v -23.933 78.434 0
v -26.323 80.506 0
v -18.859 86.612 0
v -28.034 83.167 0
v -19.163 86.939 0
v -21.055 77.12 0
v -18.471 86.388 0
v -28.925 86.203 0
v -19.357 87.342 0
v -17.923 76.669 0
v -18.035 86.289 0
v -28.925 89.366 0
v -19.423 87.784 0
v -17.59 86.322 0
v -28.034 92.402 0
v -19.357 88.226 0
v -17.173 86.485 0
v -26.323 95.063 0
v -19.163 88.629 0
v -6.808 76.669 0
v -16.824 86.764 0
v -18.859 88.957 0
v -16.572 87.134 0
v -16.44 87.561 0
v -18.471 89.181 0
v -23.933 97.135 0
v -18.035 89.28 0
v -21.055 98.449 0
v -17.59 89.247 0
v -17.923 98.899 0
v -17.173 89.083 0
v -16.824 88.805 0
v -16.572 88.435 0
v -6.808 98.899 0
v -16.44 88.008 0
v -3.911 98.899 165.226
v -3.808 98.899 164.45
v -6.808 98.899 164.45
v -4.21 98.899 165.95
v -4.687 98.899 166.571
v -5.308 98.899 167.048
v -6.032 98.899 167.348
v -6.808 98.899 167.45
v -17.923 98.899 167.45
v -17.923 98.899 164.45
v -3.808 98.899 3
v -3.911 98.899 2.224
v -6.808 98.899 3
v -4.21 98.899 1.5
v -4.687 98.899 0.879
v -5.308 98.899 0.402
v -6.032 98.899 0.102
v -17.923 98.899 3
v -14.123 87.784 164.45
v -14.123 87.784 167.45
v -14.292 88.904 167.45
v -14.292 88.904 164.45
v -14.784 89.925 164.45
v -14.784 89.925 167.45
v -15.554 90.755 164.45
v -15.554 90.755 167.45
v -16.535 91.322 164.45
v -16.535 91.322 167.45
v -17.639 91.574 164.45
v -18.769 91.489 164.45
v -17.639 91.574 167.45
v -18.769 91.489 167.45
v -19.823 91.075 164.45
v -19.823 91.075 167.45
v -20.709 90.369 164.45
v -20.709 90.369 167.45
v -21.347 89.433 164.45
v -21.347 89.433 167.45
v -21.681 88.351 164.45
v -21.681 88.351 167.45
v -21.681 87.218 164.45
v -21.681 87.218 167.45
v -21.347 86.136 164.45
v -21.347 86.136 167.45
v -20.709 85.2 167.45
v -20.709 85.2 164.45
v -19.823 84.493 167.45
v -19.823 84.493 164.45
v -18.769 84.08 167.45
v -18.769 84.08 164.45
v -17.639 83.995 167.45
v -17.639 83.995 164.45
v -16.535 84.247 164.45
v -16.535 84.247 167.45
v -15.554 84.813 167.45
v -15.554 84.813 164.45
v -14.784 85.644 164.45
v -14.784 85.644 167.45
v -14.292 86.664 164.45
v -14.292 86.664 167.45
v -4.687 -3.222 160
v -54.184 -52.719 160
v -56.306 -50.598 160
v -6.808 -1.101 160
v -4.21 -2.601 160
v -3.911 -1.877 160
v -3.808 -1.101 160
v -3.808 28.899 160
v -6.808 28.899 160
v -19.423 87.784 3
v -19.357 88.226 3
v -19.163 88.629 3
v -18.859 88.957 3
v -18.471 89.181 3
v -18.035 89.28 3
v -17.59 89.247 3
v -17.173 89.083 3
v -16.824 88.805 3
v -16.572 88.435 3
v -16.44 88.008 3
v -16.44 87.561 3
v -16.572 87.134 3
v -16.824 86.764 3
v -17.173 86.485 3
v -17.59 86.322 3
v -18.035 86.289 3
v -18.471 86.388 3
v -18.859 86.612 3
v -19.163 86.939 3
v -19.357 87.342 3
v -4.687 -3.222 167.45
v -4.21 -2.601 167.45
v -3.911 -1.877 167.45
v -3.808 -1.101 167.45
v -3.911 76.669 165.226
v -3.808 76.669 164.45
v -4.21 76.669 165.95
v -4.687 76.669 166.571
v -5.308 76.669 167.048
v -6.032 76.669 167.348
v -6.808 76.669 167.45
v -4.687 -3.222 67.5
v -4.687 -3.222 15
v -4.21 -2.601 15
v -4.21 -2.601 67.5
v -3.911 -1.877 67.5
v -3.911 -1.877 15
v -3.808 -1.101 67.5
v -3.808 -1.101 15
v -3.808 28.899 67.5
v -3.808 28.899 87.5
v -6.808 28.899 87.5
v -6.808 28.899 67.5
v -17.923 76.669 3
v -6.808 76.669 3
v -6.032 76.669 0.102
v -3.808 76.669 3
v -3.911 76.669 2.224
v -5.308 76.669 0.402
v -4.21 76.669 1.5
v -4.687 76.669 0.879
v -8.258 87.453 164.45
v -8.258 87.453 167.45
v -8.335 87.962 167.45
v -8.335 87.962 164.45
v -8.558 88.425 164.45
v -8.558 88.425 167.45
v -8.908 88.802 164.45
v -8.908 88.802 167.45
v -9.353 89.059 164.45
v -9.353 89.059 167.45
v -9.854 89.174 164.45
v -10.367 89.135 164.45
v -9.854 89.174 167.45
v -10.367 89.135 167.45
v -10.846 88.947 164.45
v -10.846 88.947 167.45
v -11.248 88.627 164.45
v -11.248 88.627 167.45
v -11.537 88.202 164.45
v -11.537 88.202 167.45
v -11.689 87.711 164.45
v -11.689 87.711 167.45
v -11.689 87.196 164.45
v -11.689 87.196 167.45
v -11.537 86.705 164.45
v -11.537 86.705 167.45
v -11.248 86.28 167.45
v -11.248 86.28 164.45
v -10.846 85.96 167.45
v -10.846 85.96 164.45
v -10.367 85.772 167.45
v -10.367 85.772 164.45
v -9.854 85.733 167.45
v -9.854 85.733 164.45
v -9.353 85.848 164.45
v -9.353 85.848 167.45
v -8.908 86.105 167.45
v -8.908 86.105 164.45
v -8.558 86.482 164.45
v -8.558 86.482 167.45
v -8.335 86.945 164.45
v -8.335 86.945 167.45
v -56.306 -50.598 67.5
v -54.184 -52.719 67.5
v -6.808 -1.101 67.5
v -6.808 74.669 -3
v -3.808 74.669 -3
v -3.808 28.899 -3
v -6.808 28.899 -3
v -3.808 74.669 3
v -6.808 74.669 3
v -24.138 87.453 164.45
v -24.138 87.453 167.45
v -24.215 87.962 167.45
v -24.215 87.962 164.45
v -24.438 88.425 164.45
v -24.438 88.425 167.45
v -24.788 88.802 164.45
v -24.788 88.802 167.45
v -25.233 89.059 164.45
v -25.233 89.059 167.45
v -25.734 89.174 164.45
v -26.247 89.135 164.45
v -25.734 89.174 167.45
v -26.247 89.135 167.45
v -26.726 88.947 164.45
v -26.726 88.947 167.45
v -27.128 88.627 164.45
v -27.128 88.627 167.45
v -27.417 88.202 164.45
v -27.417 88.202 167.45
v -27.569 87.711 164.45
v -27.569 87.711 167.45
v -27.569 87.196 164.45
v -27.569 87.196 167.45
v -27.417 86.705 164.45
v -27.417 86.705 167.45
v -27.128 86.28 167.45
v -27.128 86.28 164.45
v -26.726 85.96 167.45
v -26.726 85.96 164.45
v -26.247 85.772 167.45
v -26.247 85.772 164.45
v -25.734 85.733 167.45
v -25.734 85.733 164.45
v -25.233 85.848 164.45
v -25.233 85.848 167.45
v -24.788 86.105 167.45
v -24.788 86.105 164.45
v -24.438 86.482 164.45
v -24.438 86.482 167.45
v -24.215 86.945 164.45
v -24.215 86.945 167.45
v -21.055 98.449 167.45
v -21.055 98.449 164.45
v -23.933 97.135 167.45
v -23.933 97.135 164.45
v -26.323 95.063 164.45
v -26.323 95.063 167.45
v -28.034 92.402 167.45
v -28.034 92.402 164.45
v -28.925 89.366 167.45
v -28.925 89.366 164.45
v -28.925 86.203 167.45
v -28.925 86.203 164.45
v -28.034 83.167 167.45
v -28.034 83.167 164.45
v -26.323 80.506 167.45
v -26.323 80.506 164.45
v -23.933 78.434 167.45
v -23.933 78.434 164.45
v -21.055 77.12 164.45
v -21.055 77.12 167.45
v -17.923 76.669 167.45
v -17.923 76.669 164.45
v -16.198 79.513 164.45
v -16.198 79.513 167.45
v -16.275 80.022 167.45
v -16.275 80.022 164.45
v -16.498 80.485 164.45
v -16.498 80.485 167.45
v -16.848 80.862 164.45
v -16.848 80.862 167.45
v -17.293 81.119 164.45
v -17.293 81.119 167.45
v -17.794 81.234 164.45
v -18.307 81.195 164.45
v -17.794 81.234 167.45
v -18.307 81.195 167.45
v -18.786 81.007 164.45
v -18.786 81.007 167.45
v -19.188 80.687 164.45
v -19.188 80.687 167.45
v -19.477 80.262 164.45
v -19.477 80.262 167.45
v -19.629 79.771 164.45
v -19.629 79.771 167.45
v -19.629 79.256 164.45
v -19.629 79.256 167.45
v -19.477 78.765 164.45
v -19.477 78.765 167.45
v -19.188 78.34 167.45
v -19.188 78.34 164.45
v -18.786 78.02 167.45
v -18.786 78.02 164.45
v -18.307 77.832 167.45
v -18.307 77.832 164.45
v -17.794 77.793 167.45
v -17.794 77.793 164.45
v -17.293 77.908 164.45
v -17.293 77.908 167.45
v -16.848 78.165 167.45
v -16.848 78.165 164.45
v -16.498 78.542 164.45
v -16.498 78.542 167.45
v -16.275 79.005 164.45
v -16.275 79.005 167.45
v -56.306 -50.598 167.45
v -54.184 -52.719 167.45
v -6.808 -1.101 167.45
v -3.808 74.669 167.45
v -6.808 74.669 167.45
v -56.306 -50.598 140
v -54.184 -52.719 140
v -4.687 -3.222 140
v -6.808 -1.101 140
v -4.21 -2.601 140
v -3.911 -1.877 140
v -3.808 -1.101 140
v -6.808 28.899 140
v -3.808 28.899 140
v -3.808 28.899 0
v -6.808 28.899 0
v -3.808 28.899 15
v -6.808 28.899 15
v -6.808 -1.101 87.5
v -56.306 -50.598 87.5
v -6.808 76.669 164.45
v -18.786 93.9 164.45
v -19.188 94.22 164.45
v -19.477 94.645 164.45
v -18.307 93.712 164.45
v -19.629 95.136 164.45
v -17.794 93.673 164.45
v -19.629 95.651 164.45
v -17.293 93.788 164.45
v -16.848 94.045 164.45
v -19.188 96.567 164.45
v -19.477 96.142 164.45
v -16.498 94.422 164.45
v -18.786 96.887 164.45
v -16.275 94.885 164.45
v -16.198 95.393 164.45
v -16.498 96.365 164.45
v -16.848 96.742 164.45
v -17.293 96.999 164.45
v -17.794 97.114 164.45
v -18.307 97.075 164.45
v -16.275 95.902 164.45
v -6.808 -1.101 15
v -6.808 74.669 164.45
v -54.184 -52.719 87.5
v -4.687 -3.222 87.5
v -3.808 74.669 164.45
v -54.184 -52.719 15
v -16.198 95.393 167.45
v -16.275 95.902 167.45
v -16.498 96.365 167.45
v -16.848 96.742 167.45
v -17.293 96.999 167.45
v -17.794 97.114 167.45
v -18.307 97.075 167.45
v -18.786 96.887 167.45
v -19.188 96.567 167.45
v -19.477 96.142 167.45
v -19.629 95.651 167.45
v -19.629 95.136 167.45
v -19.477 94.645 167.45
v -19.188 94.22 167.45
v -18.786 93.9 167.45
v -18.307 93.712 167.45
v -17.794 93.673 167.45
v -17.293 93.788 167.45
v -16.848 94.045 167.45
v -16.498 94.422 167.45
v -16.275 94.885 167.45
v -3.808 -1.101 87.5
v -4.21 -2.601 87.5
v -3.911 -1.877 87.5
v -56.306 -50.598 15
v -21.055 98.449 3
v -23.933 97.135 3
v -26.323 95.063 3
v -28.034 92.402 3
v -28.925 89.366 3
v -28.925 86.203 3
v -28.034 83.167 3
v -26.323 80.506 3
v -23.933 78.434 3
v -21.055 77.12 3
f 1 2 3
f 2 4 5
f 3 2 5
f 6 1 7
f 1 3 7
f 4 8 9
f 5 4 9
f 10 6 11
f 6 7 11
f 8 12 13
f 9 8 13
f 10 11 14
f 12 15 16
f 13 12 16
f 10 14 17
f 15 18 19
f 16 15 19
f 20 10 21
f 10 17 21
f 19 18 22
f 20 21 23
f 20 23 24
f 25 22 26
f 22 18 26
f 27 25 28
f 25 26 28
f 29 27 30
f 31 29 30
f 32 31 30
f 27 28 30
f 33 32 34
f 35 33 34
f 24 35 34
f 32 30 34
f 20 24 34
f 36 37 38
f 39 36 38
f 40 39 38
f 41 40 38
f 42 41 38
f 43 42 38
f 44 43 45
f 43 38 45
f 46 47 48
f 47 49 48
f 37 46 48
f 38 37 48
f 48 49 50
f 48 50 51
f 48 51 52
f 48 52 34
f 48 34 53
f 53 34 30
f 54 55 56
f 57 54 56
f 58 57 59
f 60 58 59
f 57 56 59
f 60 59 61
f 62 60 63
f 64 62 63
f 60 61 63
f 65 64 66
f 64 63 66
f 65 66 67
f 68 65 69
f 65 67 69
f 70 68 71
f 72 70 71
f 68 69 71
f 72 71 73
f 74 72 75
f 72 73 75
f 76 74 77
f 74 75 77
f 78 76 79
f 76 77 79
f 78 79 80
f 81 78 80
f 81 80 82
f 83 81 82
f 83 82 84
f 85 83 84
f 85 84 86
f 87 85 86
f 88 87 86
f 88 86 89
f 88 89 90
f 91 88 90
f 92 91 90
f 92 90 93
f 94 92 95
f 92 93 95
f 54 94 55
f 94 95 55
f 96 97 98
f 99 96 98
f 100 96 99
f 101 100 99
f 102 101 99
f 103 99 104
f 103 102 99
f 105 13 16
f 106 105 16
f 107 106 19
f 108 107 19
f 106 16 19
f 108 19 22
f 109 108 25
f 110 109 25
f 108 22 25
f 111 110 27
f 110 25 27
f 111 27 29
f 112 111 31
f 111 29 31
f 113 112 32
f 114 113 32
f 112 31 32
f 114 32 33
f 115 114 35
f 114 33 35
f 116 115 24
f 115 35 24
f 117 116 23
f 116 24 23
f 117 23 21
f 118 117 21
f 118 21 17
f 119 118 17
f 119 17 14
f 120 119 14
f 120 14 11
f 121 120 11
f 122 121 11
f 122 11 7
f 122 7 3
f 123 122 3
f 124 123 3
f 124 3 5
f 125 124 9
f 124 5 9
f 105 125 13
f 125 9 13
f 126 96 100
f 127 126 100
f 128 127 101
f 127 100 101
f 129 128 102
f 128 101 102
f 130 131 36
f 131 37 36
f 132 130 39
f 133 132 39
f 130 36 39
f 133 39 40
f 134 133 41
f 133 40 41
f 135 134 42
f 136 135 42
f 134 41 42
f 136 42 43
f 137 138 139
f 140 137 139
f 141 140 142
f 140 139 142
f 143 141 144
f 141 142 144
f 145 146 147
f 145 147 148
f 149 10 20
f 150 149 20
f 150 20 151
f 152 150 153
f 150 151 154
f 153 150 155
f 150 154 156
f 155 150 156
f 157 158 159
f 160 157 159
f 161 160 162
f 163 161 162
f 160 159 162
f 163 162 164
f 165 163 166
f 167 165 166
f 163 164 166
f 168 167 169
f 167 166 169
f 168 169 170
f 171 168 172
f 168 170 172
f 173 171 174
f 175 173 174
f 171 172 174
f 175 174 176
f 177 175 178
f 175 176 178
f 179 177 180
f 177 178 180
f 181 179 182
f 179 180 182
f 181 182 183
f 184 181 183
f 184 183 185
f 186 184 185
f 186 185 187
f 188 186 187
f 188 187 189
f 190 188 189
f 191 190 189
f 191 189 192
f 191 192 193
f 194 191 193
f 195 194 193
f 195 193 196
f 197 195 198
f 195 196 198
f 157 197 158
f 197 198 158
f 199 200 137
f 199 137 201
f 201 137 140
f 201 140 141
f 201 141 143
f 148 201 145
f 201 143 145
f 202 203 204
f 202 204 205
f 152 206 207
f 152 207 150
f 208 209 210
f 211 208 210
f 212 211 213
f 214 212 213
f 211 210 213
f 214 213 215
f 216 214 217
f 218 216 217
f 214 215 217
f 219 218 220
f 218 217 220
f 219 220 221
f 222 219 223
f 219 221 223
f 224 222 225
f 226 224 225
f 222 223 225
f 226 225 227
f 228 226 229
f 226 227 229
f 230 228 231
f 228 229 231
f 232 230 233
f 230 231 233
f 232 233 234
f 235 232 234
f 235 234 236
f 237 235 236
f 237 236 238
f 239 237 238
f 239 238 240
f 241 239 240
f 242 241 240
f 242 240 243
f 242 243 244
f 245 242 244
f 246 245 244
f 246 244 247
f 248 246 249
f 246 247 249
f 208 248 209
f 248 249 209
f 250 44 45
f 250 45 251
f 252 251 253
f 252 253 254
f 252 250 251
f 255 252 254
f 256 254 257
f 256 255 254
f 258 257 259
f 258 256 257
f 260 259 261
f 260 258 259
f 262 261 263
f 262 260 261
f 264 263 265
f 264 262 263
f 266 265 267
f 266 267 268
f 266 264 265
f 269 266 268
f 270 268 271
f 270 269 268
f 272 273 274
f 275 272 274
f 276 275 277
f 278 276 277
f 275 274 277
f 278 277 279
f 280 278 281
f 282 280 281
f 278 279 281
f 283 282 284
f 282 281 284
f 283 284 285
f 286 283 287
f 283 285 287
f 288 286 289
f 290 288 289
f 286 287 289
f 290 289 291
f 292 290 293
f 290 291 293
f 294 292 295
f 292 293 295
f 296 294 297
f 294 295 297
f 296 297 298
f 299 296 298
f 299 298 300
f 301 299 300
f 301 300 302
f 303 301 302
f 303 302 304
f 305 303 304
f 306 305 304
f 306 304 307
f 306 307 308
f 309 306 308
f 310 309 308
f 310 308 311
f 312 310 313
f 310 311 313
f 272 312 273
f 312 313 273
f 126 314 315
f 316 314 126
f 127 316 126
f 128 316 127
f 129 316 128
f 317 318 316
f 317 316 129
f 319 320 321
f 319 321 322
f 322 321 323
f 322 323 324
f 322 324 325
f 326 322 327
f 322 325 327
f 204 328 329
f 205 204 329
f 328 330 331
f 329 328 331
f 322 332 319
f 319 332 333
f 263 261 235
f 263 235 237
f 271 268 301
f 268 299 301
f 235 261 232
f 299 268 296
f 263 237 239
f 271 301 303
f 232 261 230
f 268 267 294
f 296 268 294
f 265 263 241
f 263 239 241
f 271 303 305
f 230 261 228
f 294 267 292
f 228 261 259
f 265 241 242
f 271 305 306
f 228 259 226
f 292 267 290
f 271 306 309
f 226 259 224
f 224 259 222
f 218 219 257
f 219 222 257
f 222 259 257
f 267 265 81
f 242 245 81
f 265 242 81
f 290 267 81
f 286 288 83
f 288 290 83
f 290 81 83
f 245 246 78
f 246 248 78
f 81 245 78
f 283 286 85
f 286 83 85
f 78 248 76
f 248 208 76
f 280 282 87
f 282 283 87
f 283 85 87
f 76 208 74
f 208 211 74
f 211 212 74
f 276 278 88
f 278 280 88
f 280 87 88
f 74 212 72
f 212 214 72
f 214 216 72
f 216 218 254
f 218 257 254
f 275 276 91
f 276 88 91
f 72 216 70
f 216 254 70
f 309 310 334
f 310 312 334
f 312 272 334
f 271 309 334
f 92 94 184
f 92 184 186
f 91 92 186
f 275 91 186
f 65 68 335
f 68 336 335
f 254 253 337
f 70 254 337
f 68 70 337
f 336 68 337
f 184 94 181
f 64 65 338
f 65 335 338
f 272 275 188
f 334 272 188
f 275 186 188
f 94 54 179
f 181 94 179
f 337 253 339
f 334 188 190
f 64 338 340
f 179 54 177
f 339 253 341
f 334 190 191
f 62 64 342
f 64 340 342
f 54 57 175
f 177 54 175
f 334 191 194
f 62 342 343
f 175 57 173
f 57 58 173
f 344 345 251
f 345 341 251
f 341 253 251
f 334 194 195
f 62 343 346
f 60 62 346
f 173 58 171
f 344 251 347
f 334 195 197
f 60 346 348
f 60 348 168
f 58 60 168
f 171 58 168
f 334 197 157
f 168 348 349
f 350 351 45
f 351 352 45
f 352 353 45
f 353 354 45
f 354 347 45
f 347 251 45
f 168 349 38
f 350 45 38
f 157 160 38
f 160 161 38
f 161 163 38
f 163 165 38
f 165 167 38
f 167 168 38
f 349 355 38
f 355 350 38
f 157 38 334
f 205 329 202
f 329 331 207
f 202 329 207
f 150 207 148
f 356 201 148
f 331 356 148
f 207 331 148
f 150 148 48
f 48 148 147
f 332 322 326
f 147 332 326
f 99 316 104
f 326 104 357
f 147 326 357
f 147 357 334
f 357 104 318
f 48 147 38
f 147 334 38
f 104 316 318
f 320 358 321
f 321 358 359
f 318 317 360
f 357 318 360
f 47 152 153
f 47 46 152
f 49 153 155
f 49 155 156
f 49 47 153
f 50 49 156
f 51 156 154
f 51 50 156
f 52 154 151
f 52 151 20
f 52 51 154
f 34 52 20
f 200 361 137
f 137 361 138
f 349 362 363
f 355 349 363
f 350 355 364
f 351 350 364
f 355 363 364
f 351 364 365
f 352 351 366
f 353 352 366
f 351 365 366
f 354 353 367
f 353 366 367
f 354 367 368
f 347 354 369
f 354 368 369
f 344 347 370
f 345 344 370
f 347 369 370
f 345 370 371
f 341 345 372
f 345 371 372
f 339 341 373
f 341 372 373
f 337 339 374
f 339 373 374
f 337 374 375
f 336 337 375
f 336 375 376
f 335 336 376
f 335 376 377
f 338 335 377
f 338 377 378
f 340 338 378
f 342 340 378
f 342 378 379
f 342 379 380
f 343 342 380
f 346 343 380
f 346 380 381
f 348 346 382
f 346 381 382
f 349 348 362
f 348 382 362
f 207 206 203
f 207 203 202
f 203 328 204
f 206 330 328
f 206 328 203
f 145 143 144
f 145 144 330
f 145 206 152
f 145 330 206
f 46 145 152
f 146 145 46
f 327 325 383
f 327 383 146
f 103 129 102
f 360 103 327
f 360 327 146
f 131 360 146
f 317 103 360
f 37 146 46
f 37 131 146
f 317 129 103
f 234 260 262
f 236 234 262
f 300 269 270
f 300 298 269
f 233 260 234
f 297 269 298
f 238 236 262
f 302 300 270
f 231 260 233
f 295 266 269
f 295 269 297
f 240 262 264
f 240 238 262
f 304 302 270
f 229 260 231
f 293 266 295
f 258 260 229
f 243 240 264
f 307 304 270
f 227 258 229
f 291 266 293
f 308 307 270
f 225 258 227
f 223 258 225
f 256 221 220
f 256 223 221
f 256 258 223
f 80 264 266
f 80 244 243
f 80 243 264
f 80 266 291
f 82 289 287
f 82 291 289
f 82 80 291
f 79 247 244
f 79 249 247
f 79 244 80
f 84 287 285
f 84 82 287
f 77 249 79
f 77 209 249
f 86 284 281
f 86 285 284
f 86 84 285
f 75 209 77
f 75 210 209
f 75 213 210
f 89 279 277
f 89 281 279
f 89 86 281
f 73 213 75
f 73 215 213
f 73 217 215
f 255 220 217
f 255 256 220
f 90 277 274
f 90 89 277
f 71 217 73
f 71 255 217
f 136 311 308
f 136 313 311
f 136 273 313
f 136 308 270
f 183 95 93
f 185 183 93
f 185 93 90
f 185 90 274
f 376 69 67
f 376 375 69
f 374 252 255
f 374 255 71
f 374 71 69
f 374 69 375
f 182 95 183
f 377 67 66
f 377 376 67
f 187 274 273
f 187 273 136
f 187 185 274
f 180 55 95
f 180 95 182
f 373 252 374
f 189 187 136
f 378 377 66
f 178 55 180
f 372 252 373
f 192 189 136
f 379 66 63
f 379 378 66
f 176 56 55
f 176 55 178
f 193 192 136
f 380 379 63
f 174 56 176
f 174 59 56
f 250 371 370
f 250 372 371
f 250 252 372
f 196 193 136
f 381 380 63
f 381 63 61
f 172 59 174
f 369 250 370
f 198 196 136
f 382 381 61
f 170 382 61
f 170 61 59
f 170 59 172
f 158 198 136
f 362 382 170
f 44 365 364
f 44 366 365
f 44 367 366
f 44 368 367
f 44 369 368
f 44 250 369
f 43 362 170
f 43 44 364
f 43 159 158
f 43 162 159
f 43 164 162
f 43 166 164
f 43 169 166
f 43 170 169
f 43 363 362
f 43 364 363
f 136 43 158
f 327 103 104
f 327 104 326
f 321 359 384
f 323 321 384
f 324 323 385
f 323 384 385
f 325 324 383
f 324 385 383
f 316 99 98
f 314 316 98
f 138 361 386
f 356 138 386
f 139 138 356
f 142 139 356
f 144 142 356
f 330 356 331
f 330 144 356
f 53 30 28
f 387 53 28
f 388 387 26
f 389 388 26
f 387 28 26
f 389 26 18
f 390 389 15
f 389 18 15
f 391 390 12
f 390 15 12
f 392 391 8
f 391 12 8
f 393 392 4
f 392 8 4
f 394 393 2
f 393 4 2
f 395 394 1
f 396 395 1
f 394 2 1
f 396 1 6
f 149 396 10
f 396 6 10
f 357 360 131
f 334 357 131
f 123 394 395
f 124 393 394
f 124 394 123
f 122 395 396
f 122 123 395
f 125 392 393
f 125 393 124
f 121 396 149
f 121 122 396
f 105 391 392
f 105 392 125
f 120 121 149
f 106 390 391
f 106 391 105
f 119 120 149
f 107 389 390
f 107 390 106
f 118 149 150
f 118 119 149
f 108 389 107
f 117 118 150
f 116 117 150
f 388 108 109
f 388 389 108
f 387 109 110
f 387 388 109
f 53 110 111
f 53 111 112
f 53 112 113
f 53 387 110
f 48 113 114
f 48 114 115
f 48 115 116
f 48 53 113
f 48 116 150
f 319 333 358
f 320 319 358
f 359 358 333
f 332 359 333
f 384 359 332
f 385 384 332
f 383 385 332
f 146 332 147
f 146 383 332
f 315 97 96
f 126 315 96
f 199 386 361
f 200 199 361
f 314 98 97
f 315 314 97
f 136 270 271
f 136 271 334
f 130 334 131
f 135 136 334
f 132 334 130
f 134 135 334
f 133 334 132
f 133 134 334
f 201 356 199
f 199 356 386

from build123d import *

# Parameters (mm, degrees)
BOSS_EXTRU_1_DEPTH      = 167.45
ESQUISSE2_W             = 20
ESQUISSE2_H             = 81.618795027
ESQUISSE2_W_2           = 15
ESQUISSE2_W_3           = 3
ESQUISSE2_H_2           = 2
ENL_V_MAT_EXTRU_1_DEPTH = 53.497474683
ESQUISSE3_R             = 3.8
ESQUISSE3_R_2           = 1.725
BOSS_EXTRU_2_DEPTH      = 3
ESQUISSE4_R             = 1.5
BOSS_EXTRU_3_DEPTH      = 3
ESQUISSE5_W             = 3
ESQUISSE5_H             = 45.77
BOSS_EXTRU_4_DEPTH      = 3
CONG_1_R                = 3


with BuildPart() as part:
    # Esquisse1 → Boss.-Extru.1 (new body)
    with BuildSketch(Plane.XY):
        with BuildLine():
            Line((-6.808328014, -1.100662076), (-56.305802697, -50.598136759))
            Line((-56.305802697, -50.598136759), (-54.184482354, -52.719457103))
            Line((-54.184482354, -52.719457103), (-4.687007671, -3.22198242))
            ThreePointArc((-4.687007671, -3.22198242), (-4.036689417, -2.248712373), (-3.808328014, -1.100662076))
            Line((-3.808328014, -1.100662076), (-3.808328014, 98.899337924))
            Line((-3.808328014, 98.899337924), (-6.808328014, 98.899337924))
            Line((-6.808328014, 98.899337924), (-6.808328014, -1.100662076))
        make_face()
    extrude(amount=BOSS_EXTRU_1_DEPTH)

    # Esquisse2 → Enlèv. mat.-Extru.1 (cut, through all)
    with BuildSketch(Plane(origin=(-3.808328014, 0, 0), x_dir=(0, 0, -1), z_dir=(1, 0, 0))):
        with Locations((-150, -11.91005959)):
            Rectangle(ESQUISSE2_W, ESQUISSE2_H)
        with Locations((-7.5, -11.91005959)):
            Rectangle(ESQUISSE2_W_2, ESQUISSE2_H)
        with Locations((-77.5, -11.91005959)):
            Rectangle(ESQUISSE2_W, ESQUISSE2_H)
        with Locations((-165.95, 75.669337924)):
            Rectangle(ESQUISSE2_W_3, ESQUISSE2_H_2)
        with Locations((-1.5, 75.669337924)):
            Rectangle(ESQUISSE2_W_3, ESQUISSE2_H_2)
    extrude(amount=-ENL_V_MAT_EXTRU_1_DEPTH, mode=Mode.SUBTRACT)

    # Esquisse3 → Boss.-Extru.2 (add)
    with BuildSketch(Plane.XY.offset(167.45)):
        with BuildLine():
            Line((-6.808328014, 98.899337924), (-17.923328014, 98.899337924))
            ThreePointArc((-17.923328014, 98.899337924), (-29.038328014, 87.784337924), (-17.923328014, 76.669337924))
            Line((-17.923328014, 76.669337924), (-6.808328014, 76.669337924))
            Line((-6.808328014, 76.669337924), (-6.808328014, 98.899337924))
        make_face()
        with Locations((-17.923328014, 87.784337924)):
            Circle(ESQUISSE3_R, mode=Mode.SUBTRACT)
        with Locations((-25.863328014, 87.453430664)):
            Circle(ESQUISSE3_R_2, mode=Mode.SUBTRACT)
        with Locations((-17.923328014, 95.393430664)):
            Circle(ESQUISSE3_R_2, mode=Mode.SUBTRACT)
        with Locations((-9.983328014, 87.453430664)):
            Circle(ESQUISSE3_R_2, mode=Mode.SUBTRACT)
        with Locations((-17.923328014, 79.513430664)):
            Circle(ESQUISSE3_R_2, mode=Mode.SUBTRACT)
    extrude(amount=-BOSS_EXTRU_2_DEPTH)

    # Esquisse4 → Boss.-Extru.3 (add)
    with BuildSketch(Plane(origin=(0, 0, 0), x_dir=(-1, 0, 0), z_dir=(0, 0, -1))):
        with BuildLine():
            Line((6.808328014, 98.899337924), (17.923328014, 98.899337924))
            ThreePointArc((17.923328014, 98.899337924), (29.038328014, 87.784337924), (17.923328014, 76.669337924))
            Line((17.923328014, 76.669337924), (6.808328014, 76.669337924))
            Line((6.808328014, 76.669337924), (6.808328014, 98.899337924))
        make_face()
        with Locations((17.923328014, 87.784337924)):
            Circle(ESQUISSE4_R, mode=Mode.SUBTRACT)
    extrude(amount=-BOSS_EXTRU_3_DEPTH)

    # Esquisse5 → Boss.-Extru.4 (add)
    with BuildSketch(Plane(origin=(0, 0, 0), x_dir=(-1, 0, 0), z_dir=(0, 0, -1))):
        with Locations((5.308328014, 51.784337924)):
            Rectangle(ESQUISSE5_W, ESQUISSE5_H)
    extrude(amount=BOSS_EXTRU_4_DEPTH)

    # Congé1
    cong_1_edges = [part.edges().sort_by_distance(p)[0] for p in [
        (-3.808328014, 87.784337924, 0),
        (-3.808328014, 87.784337924, 167.45),
    ]]
    fillet(cong_1_edges, radius=CONG_1_R)


solid = part.part
